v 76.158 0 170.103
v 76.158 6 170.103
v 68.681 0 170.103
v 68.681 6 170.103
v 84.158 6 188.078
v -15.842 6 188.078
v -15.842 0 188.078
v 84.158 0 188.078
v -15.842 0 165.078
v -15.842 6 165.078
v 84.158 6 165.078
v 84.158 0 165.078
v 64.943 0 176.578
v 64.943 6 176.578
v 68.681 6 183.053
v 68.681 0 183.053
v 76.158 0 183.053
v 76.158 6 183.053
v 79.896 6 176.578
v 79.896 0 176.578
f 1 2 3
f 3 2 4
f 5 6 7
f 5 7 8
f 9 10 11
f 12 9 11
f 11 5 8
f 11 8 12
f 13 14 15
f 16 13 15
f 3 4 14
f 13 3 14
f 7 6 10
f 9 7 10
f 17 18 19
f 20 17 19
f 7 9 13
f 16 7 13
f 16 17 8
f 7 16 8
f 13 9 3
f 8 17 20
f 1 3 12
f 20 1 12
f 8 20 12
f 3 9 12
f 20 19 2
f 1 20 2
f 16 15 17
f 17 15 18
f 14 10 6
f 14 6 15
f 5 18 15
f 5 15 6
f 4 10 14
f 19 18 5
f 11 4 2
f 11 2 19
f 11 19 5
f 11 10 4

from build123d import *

# Parameters (mm, degrees)
SZKIC2_W                    = 100
SZKIC2_H                    = 23
DODANIE_WYCI_GNI_CIE1_DEPTH = 6
WYTNIJ_WYCI_GNI_CIE1_DEPTH  = 6


with BuildPart() as part:
    # Szkic2 → Dodanie-wyciągnięcie1 (new body)
    with BuildSketch(Plane(origin=(0, 6, 0), x_dir=(1, 0, 0), z_dir=(0, 1, 0))):
        with Locations((34.15799092, -176.577789634)):
            Rectangle(SZKIC2_W, SZKIC2_H)
    extrude(amount=-DODANIE_WYCI_GNI_CIE1_DEPTH)

    # Szkic3 → Wytnij-wyciągnięcie1 (cut)
    with BuildSketch(Plane(origin=(0, 6, 0), x_dir=(1, 0, 0), z_dir=(0, 1, 0))):
        Polygon((64.942961941, -176.577789634), (68.681304934, -183.052789634), (76.15799092, -183.052789634), (79.896333913, -176.577789634), (76.15799092, -170.102789634), (68.681304934, -170.102789634), align=None)
    extrude(amount=-WYTNIJ_WYCI_GNI_CIE1_DEPTH, mode=Mode.SUBTRACT)


solid = part.part
